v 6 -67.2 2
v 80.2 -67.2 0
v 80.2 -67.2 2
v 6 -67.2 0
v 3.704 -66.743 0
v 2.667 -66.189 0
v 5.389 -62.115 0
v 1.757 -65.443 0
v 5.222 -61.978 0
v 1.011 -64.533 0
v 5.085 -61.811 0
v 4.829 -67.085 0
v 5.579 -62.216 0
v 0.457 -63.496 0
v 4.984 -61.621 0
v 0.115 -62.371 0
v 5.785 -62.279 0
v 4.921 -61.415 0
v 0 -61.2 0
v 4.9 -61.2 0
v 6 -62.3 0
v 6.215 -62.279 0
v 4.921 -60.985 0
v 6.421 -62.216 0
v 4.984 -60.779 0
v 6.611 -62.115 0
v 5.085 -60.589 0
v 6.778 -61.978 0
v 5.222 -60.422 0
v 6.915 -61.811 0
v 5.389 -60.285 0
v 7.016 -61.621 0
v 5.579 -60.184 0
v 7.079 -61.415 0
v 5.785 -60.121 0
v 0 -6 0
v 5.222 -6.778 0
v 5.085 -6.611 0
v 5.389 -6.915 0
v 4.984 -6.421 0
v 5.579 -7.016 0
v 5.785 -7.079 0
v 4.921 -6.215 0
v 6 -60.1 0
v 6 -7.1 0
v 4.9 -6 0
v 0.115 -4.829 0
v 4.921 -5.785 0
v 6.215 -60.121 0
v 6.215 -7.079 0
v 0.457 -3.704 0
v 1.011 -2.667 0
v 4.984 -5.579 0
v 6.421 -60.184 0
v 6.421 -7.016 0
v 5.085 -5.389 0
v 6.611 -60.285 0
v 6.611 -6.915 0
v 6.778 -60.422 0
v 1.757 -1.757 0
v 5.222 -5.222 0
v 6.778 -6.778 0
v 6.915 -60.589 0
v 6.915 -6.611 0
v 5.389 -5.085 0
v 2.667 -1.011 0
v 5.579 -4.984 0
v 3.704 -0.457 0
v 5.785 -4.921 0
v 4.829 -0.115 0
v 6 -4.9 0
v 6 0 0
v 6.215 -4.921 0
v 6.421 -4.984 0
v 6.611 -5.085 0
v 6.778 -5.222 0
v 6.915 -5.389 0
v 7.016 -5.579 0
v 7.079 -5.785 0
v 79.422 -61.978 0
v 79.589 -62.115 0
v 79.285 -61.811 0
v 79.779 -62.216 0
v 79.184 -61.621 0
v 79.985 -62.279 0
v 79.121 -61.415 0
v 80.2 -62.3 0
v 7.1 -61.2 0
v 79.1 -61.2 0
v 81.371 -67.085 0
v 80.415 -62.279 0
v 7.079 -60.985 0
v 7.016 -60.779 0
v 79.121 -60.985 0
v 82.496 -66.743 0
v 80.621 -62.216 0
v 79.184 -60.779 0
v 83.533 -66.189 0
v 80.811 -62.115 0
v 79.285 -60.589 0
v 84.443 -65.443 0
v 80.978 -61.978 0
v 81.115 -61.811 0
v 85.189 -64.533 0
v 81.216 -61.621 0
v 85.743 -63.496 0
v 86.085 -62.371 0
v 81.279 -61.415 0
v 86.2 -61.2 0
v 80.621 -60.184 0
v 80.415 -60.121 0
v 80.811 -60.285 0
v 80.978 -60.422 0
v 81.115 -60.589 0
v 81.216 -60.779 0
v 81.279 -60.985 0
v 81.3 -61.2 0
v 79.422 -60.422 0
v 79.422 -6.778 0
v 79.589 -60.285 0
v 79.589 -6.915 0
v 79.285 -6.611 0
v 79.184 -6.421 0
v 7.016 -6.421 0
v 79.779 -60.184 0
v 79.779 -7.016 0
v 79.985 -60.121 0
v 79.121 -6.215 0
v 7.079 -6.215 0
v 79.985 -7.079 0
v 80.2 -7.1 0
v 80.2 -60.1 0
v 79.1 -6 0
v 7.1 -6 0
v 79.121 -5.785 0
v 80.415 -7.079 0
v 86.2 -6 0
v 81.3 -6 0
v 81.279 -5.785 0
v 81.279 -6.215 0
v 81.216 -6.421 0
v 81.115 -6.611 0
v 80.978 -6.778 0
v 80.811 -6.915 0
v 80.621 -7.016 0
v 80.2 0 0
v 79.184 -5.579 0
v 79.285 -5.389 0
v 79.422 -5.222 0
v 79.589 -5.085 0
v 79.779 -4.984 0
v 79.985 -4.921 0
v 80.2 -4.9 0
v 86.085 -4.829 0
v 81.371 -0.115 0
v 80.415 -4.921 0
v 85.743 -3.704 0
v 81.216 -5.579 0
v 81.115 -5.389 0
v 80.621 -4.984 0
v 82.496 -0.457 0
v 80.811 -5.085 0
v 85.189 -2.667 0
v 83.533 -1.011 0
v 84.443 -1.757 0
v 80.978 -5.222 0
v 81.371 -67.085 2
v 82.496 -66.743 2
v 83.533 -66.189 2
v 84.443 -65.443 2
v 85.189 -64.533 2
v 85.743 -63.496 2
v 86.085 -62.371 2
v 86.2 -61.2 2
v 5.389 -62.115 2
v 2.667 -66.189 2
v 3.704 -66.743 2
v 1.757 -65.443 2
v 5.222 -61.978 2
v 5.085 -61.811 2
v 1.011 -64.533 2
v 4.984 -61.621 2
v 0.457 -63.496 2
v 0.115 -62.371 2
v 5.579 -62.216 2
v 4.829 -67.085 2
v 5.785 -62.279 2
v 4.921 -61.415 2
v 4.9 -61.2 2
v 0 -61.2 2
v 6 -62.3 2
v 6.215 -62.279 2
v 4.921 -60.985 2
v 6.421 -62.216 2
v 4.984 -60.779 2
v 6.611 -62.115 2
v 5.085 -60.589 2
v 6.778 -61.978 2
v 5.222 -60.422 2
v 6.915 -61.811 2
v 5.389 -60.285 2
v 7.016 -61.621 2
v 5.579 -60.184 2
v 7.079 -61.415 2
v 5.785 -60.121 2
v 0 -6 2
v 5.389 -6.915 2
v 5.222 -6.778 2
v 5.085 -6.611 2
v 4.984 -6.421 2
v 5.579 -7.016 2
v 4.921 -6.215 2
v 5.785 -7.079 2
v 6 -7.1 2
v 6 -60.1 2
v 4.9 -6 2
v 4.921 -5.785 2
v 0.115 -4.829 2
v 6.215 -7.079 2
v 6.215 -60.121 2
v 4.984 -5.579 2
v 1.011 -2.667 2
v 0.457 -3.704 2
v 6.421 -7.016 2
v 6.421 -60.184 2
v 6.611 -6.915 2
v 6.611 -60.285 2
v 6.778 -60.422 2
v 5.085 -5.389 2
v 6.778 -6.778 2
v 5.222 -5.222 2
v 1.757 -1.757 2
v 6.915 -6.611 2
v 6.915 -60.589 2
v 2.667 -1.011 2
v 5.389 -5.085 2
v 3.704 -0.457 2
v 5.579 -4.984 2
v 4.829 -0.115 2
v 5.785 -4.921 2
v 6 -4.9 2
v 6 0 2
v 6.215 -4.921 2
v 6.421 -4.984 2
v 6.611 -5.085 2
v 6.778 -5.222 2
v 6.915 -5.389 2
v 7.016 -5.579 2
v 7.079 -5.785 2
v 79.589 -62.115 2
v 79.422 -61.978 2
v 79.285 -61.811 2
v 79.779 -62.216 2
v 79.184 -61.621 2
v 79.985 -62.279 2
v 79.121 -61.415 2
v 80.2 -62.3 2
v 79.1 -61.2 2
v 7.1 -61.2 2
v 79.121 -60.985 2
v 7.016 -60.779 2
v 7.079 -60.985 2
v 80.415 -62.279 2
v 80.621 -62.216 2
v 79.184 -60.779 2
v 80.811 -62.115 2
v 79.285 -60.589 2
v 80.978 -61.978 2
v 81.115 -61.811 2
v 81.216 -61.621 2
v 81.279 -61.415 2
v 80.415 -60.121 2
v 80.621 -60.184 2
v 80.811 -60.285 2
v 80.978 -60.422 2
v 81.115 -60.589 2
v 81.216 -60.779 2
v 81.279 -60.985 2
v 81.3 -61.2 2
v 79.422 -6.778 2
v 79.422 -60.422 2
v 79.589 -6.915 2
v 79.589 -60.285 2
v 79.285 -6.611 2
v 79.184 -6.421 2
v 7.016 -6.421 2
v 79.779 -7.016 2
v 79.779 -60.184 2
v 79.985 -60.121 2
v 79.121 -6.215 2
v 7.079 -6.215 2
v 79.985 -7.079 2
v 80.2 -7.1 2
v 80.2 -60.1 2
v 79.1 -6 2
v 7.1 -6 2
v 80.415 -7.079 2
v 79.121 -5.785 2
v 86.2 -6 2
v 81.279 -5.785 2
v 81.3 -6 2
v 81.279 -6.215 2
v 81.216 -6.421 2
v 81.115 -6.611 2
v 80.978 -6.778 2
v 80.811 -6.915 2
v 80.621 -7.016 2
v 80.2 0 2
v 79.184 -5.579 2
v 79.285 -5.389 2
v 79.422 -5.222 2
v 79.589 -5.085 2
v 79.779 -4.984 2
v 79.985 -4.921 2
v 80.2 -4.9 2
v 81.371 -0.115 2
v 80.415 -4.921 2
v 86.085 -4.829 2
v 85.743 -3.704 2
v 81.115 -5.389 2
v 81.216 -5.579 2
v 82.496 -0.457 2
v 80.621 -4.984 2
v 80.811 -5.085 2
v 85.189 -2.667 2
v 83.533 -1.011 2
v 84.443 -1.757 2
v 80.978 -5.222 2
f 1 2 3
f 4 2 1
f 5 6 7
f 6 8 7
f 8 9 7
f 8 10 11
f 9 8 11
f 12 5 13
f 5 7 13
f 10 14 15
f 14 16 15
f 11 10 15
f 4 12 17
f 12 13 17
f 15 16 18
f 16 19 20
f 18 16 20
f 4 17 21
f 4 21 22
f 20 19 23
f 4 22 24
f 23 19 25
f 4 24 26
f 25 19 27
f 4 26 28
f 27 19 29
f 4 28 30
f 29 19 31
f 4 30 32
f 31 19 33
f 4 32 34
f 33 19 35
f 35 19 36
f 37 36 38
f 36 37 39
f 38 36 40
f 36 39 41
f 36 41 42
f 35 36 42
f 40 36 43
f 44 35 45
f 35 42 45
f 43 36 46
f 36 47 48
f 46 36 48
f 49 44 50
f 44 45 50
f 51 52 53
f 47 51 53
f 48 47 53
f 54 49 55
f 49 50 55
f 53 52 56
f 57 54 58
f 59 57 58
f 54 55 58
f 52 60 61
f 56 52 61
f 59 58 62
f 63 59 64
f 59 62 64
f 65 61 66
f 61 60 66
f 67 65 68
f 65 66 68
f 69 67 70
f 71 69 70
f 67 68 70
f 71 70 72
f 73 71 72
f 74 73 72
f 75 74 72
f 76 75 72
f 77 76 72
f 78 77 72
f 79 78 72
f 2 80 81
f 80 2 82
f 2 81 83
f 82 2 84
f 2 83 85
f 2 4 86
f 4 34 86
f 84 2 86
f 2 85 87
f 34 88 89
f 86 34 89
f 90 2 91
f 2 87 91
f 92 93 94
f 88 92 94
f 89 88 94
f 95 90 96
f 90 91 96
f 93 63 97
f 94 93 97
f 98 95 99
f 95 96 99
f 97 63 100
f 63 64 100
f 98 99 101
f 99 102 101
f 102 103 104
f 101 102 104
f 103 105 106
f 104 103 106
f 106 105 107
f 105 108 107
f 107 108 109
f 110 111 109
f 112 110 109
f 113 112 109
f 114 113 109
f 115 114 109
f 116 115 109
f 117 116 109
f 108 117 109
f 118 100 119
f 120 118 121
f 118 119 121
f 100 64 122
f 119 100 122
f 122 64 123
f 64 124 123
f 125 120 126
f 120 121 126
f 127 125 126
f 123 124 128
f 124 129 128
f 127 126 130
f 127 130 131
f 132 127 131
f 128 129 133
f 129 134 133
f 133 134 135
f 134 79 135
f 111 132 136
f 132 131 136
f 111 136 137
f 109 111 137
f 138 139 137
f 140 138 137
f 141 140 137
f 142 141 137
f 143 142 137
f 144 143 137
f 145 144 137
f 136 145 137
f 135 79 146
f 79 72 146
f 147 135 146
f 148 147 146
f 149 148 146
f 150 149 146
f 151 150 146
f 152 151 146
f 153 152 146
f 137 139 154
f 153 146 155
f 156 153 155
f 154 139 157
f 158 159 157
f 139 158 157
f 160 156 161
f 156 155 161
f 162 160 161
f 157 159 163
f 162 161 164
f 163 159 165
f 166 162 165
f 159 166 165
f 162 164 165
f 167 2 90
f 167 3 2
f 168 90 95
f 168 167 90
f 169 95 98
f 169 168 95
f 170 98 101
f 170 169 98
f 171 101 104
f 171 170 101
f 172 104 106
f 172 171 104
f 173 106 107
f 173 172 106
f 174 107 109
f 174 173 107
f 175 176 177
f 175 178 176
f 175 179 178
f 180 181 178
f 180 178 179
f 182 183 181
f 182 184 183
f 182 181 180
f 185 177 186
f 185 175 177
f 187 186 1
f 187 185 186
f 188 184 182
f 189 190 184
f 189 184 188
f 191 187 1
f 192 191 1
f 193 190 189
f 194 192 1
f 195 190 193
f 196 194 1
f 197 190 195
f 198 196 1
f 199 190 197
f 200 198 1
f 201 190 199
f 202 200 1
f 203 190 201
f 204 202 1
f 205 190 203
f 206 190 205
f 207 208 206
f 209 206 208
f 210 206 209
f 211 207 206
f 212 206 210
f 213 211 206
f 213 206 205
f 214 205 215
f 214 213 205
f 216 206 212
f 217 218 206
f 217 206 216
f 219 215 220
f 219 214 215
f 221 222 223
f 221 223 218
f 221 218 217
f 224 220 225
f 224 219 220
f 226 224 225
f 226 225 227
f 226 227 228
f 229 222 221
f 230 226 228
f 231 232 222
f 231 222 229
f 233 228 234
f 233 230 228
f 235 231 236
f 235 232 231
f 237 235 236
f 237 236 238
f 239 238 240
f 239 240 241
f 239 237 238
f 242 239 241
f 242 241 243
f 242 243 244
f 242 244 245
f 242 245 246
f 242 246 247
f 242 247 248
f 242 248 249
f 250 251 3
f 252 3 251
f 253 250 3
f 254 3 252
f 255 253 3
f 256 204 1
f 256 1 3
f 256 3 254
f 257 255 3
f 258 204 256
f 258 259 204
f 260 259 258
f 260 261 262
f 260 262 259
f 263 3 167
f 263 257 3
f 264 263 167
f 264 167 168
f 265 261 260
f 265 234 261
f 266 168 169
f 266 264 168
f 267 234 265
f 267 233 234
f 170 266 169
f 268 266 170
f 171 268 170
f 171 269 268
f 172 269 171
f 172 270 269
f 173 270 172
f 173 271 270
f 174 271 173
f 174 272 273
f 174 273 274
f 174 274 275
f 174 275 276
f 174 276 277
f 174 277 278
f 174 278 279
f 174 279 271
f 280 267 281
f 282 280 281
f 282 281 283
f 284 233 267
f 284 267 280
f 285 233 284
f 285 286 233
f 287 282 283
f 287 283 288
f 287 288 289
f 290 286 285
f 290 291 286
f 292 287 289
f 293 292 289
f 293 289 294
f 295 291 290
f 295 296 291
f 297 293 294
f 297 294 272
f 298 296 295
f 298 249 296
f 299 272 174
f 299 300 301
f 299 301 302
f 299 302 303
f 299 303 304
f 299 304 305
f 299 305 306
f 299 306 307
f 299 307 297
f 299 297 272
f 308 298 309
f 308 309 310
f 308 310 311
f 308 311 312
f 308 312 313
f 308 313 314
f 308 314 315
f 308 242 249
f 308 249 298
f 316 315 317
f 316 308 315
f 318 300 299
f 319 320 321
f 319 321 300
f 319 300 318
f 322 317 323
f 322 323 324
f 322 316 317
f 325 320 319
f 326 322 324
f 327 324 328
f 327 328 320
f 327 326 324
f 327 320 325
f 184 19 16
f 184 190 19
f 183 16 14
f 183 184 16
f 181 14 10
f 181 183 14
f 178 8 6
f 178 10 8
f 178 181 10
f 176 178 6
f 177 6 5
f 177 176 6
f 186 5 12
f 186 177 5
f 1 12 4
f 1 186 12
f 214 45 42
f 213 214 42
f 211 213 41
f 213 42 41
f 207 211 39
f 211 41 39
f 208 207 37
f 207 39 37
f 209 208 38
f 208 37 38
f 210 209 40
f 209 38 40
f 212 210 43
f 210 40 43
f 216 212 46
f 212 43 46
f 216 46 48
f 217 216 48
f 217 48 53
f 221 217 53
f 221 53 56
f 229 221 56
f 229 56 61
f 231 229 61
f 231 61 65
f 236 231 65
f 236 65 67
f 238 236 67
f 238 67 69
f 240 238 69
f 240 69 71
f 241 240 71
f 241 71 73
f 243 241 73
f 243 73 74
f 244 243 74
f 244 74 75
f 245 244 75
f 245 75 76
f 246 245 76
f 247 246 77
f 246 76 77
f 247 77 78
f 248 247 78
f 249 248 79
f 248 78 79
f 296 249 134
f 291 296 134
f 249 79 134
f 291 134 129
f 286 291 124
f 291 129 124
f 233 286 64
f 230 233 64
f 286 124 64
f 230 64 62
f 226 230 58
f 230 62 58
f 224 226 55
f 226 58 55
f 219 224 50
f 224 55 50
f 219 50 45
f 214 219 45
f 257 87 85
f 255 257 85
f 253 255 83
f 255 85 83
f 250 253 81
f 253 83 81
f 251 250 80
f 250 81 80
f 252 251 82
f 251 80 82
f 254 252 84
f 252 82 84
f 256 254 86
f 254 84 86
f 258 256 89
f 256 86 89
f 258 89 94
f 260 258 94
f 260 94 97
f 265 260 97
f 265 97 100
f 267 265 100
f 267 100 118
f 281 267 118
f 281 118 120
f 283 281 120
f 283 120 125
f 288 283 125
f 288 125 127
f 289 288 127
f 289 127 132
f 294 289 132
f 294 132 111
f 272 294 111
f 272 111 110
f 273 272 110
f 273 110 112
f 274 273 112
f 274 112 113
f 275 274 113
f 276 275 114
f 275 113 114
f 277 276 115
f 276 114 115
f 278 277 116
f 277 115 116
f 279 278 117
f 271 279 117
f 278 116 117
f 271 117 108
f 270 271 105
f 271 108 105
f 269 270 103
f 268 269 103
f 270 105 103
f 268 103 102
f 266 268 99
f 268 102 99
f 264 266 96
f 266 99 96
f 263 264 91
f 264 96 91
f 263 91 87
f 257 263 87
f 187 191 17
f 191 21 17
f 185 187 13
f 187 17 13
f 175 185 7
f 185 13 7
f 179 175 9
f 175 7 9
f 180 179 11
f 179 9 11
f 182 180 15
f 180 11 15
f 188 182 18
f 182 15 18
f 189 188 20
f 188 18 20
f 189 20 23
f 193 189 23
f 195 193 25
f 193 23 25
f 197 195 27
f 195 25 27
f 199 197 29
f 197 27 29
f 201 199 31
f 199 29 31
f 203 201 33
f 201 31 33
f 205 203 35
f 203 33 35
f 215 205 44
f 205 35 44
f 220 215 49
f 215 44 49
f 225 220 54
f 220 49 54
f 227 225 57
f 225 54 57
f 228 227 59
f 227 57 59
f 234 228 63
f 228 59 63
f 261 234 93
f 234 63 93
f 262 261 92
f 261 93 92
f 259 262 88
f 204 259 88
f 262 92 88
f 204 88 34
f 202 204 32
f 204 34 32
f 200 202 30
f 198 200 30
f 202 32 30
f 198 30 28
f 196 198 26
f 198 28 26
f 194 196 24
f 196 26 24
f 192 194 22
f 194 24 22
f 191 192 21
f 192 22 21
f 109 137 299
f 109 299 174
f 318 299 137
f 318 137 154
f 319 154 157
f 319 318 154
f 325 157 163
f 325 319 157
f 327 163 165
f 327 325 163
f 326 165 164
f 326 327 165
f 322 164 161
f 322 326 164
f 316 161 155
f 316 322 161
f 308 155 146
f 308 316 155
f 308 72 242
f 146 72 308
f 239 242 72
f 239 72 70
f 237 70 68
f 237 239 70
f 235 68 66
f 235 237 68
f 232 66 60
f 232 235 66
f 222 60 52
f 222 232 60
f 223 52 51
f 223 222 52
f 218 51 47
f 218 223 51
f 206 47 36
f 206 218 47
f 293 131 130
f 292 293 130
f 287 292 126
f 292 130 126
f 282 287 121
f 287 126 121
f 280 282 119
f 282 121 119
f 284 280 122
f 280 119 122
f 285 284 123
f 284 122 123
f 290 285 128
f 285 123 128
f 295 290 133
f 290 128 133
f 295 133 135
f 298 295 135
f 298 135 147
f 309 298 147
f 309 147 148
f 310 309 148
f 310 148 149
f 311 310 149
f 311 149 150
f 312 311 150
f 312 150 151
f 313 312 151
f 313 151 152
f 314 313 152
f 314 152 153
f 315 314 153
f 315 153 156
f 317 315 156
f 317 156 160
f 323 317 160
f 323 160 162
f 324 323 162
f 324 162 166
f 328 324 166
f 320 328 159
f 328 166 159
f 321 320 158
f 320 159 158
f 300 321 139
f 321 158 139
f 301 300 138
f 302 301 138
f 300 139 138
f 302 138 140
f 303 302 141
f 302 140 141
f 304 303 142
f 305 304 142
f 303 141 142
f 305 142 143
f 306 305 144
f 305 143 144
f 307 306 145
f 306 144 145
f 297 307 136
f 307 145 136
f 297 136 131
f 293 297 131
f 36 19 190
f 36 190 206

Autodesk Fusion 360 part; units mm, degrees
sketch "Sketch1" plane through (0, 0, 0) normal (0, 0, 1) x (1, 0, 0)
  line L0 (0, 0) -> (86.2, 0)
  line L1 (86.2, 0) -> (86.2, -67.2)
  line L2 (86.2, -67.2) -> (0, -67.2)
  line L3 (0, -67.2) -> (0, 0)
  dimension "d1" = 86.2
  dimension "d2" = 67.2
extrude "Extrude1" add sketch "Sketch1" along normal blind 2
fillet "Fillet1" radius 6 4 edges at (0, 0, 1) (0, -67.2, 1) (86.2, -67.2, 1) (86.2, 0, 1)
sketch "Sketch2" plane through (0, 0, 2) normal (0, 0, 1) x (-1, 0, 0)
  arc A0 (-86.2, 6) -> (-80.2, 0) centre (-80.2, 6) ccw
  line L0 (-80.2, 0) -> (-6, 0)
  arc A1 (-6, 0) -> (0, 6) centre (-6, 6) ccw
  line L1 (0, 6) -> (0, 61.2)
  arc A2 (0, 61.2) -> (-6, 67.2) centre (-6, 61.2) ccw
  line L2 (-6, 67.2) -> (-80.2, 67.2)
  arc A3 (-80.2, 67.2) -> (-86.2, 61.2) centre (-80.2, 61.2) ccw
  line L3 (-86.2, 61.2) -> (-86.2, 6)
  circle A4 centre (-80.2, 61.2) radius 1.1
  circle A5 centre (-6, 61.2) radius 1.1
  circle A6 centre (-6, 6) radius 1.1
  circle A7 centre (-80.2, 6) radius 1.1
  dimension "d7" = 2.2
  dimension "d8" = 2.2
  dimension "d9" = 2.2
  dimension "d10" = 2.2
  dimension "d11" = 6
  dimension "d12" = 6
  dimension "d13" = 6
  dimension "d14" = 6
  dimension "d15" = 6
  dimension "d16" = 6
  dimension "d17" = 6
  dimension "d18" = 6
hole "Hole1" at (80.2, -61.2, 2) at (6, -61.2, 2) at (6, -6, 2) at (80.2, -6, 2) direction (0, 0, -1) diameter 2.2 depth 2.2 tip angle 118
